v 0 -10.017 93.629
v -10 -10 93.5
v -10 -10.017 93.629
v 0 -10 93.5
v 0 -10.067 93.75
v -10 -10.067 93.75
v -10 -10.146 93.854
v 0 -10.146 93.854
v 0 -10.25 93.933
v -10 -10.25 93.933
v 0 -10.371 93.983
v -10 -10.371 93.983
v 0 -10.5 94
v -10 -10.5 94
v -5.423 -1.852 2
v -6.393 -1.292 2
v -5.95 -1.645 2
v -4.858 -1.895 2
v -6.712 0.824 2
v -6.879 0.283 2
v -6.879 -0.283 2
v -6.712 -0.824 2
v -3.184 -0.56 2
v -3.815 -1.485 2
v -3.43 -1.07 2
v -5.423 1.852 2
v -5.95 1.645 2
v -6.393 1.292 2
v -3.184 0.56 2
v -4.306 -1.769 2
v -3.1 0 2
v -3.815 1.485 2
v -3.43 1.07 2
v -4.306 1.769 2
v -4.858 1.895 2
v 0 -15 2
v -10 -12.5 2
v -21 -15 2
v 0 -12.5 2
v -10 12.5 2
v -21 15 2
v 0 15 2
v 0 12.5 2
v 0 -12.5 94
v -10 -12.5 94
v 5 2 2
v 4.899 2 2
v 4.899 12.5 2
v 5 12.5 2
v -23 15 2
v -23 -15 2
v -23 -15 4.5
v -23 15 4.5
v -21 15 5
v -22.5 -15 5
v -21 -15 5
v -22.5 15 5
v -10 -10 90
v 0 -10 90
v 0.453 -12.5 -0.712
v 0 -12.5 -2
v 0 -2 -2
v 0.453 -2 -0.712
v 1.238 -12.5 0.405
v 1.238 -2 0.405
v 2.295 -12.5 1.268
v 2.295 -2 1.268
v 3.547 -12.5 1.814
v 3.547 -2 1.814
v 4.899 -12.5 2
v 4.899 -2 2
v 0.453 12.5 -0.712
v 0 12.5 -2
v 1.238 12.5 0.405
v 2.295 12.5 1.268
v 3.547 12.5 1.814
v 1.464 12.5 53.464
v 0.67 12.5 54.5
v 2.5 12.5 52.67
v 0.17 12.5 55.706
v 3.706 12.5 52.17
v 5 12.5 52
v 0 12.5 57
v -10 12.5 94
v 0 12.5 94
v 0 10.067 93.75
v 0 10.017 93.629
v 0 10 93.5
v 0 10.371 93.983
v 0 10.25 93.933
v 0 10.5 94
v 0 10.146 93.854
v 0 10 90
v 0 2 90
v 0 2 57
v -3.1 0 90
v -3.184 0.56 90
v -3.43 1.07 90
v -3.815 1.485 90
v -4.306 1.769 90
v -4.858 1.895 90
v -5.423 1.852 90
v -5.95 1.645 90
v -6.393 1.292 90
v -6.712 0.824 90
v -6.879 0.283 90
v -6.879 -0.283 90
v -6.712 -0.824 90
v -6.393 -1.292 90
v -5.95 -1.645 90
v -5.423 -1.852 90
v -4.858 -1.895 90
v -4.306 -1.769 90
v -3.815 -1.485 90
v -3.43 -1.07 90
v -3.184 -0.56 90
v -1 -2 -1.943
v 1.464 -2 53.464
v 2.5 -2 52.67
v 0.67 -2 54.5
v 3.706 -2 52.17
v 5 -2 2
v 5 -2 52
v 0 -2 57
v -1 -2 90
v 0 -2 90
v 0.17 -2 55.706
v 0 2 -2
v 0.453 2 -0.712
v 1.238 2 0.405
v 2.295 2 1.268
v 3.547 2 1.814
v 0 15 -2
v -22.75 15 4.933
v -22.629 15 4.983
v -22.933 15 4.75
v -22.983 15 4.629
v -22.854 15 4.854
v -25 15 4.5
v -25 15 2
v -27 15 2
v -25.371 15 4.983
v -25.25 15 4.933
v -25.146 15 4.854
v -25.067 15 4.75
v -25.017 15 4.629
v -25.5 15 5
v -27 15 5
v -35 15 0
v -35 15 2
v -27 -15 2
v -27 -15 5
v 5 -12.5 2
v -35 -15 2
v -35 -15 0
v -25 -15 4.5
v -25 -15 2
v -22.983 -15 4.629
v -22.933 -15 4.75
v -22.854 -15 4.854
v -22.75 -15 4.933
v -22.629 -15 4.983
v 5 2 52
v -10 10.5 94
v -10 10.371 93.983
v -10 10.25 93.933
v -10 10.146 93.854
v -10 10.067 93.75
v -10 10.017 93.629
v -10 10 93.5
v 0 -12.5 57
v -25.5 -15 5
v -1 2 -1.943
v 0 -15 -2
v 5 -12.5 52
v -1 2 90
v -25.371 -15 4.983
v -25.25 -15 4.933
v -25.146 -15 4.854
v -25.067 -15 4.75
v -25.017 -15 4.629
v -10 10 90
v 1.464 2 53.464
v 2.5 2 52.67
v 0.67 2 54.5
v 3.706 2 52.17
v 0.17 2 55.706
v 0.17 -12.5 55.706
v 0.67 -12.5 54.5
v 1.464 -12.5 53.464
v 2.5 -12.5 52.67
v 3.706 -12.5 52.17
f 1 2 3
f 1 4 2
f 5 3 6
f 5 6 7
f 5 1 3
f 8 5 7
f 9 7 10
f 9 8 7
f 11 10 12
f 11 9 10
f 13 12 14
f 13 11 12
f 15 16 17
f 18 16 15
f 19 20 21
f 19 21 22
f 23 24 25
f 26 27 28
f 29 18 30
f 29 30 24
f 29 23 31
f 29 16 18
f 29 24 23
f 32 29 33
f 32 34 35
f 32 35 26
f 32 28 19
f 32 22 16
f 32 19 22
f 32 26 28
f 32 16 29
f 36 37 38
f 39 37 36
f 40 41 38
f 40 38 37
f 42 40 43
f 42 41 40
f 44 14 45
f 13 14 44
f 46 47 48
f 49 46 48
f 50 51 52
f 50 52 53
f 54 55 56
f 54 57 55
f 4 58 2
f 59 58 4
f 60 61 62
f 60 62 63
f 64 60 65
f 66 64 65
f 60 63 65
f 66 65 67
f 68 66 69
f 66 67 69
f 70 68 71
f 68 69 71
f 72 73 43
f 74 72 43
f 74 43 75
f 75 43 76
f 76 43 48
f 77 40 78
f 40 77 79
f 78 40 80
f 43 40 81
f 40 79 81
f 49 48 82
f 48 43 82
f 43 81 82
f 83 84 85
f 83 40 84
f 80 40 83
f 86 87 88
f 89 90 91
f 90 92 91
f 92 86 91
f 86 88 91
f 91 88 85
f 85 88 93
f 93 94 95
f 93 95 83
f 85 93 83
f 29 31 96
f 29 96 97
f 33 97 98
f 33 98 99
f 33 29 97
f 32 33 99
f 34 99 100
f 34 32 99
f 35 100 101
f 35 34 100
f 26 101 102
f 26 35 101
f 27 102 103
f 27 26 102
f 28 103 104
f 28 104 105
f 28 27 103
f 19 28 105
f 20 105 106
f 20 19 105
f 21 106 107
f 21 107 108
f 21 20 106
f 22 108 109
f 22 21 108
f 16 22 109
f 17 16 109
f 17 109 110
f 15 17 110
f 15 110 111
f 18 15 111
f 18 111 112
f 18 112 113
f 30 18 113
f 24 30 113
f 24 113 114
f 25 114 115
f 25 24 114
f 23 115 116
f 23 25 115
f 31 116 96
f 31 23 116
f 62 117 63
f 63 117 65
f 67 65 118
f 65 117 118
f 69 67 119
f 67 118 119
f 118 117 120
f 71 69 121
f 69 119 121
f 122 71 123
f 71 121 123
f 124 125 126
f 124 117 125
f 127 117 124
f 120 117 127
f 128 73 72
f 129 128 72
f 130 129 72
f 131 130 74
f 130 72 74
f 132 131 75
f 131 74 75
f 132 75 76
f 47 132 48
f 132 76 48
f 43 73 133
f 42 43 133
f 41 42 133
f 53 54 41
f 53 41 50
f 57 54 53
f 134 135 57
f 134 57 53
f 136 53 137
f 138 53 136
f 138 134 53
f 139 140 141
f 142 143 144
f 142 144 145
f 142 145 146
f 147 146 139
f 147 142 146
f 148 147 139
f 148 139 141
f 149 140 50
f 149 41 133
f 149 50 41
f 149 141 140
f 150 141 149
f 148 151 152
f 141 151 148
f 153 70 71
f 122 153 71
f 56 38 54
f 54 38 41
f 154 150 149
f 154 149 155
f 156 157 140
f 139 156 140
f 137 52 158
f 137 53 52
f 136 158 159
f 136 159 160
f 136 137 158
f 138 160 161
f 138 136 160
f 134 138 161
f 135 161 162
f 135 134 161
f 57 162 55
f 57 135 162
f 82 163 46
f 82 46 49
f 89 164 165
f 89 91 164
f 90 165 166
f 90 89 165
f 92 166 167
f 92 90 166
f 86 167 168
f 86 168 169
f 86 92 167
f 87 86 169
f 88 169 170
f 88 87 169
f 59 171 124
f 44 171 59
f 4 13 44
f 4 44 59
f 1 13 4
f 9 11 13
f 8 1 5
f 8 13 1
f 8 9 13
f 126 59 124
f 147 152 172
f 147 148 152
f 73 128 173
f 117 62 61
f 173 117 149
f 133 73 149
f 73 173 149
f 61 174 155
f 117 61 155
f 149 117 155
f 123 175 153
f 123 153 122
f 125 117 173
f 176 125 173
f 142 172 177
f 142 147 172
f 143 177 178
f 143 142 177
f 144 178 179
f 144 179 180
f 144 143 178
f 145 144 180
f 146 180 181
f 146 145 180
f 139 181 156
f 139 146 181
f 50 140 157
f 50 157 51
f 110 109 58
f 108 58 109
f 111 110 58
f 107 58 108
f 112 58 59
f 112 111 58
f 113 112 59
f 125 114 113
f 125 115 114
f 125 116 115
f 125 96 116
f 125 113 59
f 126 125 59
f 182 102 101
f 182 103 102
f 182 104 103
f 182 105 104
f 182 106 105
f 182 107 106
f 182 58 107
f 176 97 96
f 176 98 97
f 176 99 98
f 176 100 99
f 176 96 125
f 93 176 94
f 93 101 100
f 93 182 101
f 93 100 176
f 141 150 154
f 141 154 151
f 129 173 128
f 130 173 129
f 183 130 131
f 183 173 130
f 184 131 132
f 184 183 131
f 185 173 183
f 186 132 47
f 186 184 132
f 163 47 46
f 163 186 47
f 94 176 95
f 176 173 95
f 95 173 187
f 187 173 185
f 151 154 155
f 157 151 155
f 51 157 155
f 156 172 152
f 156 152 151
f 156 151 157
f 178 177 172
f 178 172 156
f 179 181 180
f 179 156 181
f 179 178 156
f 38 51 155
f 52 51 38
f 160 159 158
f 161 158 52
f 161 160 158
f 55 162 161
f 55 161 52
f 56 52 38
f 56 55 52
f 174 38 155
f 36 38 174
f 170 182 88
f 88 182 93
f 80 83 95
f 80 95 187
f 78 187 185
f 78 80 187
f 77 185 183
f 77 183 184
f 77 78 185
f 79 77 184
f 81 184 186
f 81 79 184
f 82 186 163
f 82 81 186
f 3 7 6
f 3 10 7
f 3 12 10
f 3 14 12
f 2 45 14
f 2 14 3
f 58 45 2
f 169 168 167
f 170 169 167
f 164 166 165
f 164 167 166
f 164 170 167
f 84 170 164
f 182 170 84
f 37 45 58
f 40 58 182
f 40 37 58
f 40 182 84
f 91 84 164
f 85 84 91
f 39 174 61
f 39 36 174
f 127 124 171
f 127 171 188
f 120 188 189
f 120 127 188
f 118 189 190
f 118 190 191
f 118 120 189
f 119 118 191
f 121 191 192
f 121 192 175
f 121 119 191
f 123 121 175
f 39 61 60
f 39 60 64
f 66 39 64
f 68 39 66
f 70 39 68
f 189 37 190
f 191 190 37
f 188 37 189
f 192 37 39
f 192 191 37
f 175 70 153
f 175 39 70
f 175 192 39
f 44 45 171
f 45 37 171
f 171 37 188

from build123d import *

# Parameters (mm, degrees)
F1_DEPTH      = 2
F2_R          = 1.9
F3_DEPTH      = 88
F4_W          = 2
F4_H          = 30
F5_DEPTH      = 3
F6_DEPTH      = 2
F8_DEPTH      = 30.001
F9_W          = 10
F9_H          = 2.5
F10_DEPTH     = 92
F11_R         = 0.5
F12_W         = 10.5
F12_H         = 50
F13_DEPTH     = 5
F14_T1_DEPTH  = 10.5
F14_T3_DEPTH  = 10.5
F14_T8_DEPTH  = 34.9948974279
F14_T13_DEPTH = 34.9948974279
F14_T18_DEPTH = 35.5
F14_T23_DEPTH = 35.5


# Not quite as in the source:
# - a fillet or chamfer that OpenCascade refuses, or shapes differently, is made with other operations: its cross-section is extruded or revolved along the edge and cut away or added


with BuildPart() as f1:
    # F0 (on Top) → F1 (new body)
    with BuildSketch(Plane.XY):
        Polygon((0, 2), (0, 15), (-35, 15), (-35, -15), (0, -15), (0, -2), (-1, -2), (-1, 2), align=None)
    extrude(amount=F1_DEPTH)

    # F2 (on face) → F3 (join)
    with BuildSketch(Plane.XY.offset(2)):
        Polygon((-1, 2), (0, 2), (0, 10), (-10, 10), (-10, -10), (0, -10), (0, -2), (-1, -2), align=None)
        with Locations((-5, 0)):
            Circle(F2_R, mode=Mode.SUBTRACT)
    extrude(amount=F3_DEPTH)

    # F4 (on face) → F5 (join)
    with BuildSketch(Plane.XY.offset(2)):
        with Locations((-26, 0)):
            Rectangle(F4_W, F4_H)
        with Locations((-22, 0)):
            Rectangle(F4_W, F4_H)
    extrude(amount=F5_DEPTH)

    # F6 (add): a face of the model
    f6_faces = [f1.faces().sort_by_distance(p)[0] for p in [
        (-17.5650095602, 0, 0),
    ]]
    extrude(f6_faces, amount=F6_DEPTH)

    # F7 (on face) → F8 (cut, through all)
    with BuildSketch(Plane.XZ.offset(15)):
        Polygon((0, -2), (-35, 0), (-35, -2), align=None)
    extrude(amount=-F8_DEPTH, mode=Mode.SUBTRACT)

    # F9 (on face) → F10 (join)
    with BuildSketch(Plane.XY.offset(2)):
        with Locations((-5, 11.25)):
            Rectangle(F9_W, F9_H)
        with Locations((-5, -11.25)):
            Rectangle(F9_W, F9_H)
    extrude(amount=F10_DEPTH)

    # F11
    f11_edges = [f1.edges().sort_by_distance(p)[0] for p in [
        (-25, 0, 5),
        (-23, 0, 5),
        (-5, 10, 94),
        (-5, -10, 94),
    ]]
    fillet(f11_edges, radius=F11_R)

    # F12 (on face) → F13 (join)
    with BuildSketch(Plane.YZ):
        with Locations((7.25, 27)):
            Rectangle(F12_W, F12_H)
        with Locations((-7.25, 27)):
            Rectangle(F12_W, F12_H)
    extrude(amount=F13_DEPTH)

    # F14: fillet of radius 5 on 4 edges, made by hand

    # F14_s2 → F14_t1 (join)
    with BuildSketch(Plane.XZ.offset(2)):
        with BuildLine():
            ThreePointArc((0, -2), (1.7367018254, 0.8729833462), (4.8989794856, 2))
            Line((4.8989794856, 2), (0, 2))
            Line((0, 2), (0, -2))
        make_face()
        with BuildLine():
            ThreePointArc((0, 57), (1.4644660941, 53.4644660941), (5, 52))
            Line((5, 52), (0, 52))
            Line((0, 52), (0, 57))
        make_face()
    extrude(amount=F14_T1_DEPTH)

    # F14_s4 → F14_t3 (join)
    with BuildSketch(Plane.XZ.offset(-12.5)):
        with BuildLine():
            ThreePointArc((0, -2), (1.7367018254, 0.8729833462), (4.8989794856, 2))
            Line((4.8989794856, 2), (0, 2))
            Line((0, 2), (0, -2))
        make_face()
        with BuildLine():
            ThreePointArc((0, 57), (1.4644660941, 53.4644660941), (5, 52))
            Line((5, 52), (0, 52))
            Line((0, 52), (0, 57))
        make_face()
    extrude(amount=F14_T3_DEPTH)


with BuildPart() as f14_tool6:
    # F14_s7 → F14_t8 (new body)
    with BuildSketch(Plane.XZ.offset(24.7474487139)):
        with BuildLine():
            ThreePointArc((0, -2), (1.7367018254, 0.8729833462), (4.8989794856, 2))
            Line((4.8989794856, 2), (0, 2))
            Line((0, 2), (0, -2))
        make_face()
    extrude(amount=-F14_T8_DEPTH)

    split(bisect_by=Plane.XZ.offset(-2), keep=Keep.BOTTOM)


with BuildPart() as f1_1:
    add(f1.part)

    # F14_t5: union F14_tool6
    add(f14_tool6.part)


with BuildPart() as f14_tool11:
    # F14_s12 → F14_t13 (new body)
    with BuildSketch(Plane.XZ.offset(10.2474487139)):
        with BuildLine():
            ThreePointArc((0, -2), (1.7367018254, 0.8729833462), (4.8989794856, 2))
            Line((4.8989794856, 2), (0, 2))
            Line((0, 2), (0, -2))
        make_face()
    extrude(amount=-F14_T13_DEPTH)

    split(bisect_by=Plane.XZ.offset(2), keep=Keep.TOP)


with BuildPart() as f1_2:
    add(f1_1.part)

    # F14_t10: union F14_tool11
    add(f14_tool11.part)


with BuildPart() as f14_tool16:
    # F14_s17 → F14_t18 (new body)
    with BuildSketch(Plane.XZ.offset(-10.5)):
        with BuildLine():
            ThreePointArc((0, 57), (1.4644660941, 53.4644660941), (5, 52))
            Line((5, 52), (0, 52))
            Line((0, 52), (0, 57))
        make_face()
    extrude(amount=F14_T18_DEPTH)

    split(bisect_by=Plane.XZ.offset(-2), keep=Keep.BOTTOM)


with BuildPart() as f1_3:
    add(f1_2.part)

    # F14_t15: union F14_tool16
    add(f14_tool16.part)


with BuildPart() as f14_tool21:
    # F14_s22 → F14_t23 (new body)
    with BuildSketch(Plane.XZ.offset(-25)):
        with BuildLine():
            ThreePointArc((0, 57), (1.4644660941, 53.4644660941), (5, 52))
            Line((5, 52), (0, 52))
            Line((0, 52), (0, 57))
        make_face()
    extrude(amount=F14_T23_DEPTH)

    split(bisect_by=Plane.XZ.offset(2), keep=Keep.TOP)


with BuildPart() as f1_4:
    add(f1_3.part)

    # F14_t20: union F14_tool21
    add(f14_tool21.part)


solid = f1_4.part
